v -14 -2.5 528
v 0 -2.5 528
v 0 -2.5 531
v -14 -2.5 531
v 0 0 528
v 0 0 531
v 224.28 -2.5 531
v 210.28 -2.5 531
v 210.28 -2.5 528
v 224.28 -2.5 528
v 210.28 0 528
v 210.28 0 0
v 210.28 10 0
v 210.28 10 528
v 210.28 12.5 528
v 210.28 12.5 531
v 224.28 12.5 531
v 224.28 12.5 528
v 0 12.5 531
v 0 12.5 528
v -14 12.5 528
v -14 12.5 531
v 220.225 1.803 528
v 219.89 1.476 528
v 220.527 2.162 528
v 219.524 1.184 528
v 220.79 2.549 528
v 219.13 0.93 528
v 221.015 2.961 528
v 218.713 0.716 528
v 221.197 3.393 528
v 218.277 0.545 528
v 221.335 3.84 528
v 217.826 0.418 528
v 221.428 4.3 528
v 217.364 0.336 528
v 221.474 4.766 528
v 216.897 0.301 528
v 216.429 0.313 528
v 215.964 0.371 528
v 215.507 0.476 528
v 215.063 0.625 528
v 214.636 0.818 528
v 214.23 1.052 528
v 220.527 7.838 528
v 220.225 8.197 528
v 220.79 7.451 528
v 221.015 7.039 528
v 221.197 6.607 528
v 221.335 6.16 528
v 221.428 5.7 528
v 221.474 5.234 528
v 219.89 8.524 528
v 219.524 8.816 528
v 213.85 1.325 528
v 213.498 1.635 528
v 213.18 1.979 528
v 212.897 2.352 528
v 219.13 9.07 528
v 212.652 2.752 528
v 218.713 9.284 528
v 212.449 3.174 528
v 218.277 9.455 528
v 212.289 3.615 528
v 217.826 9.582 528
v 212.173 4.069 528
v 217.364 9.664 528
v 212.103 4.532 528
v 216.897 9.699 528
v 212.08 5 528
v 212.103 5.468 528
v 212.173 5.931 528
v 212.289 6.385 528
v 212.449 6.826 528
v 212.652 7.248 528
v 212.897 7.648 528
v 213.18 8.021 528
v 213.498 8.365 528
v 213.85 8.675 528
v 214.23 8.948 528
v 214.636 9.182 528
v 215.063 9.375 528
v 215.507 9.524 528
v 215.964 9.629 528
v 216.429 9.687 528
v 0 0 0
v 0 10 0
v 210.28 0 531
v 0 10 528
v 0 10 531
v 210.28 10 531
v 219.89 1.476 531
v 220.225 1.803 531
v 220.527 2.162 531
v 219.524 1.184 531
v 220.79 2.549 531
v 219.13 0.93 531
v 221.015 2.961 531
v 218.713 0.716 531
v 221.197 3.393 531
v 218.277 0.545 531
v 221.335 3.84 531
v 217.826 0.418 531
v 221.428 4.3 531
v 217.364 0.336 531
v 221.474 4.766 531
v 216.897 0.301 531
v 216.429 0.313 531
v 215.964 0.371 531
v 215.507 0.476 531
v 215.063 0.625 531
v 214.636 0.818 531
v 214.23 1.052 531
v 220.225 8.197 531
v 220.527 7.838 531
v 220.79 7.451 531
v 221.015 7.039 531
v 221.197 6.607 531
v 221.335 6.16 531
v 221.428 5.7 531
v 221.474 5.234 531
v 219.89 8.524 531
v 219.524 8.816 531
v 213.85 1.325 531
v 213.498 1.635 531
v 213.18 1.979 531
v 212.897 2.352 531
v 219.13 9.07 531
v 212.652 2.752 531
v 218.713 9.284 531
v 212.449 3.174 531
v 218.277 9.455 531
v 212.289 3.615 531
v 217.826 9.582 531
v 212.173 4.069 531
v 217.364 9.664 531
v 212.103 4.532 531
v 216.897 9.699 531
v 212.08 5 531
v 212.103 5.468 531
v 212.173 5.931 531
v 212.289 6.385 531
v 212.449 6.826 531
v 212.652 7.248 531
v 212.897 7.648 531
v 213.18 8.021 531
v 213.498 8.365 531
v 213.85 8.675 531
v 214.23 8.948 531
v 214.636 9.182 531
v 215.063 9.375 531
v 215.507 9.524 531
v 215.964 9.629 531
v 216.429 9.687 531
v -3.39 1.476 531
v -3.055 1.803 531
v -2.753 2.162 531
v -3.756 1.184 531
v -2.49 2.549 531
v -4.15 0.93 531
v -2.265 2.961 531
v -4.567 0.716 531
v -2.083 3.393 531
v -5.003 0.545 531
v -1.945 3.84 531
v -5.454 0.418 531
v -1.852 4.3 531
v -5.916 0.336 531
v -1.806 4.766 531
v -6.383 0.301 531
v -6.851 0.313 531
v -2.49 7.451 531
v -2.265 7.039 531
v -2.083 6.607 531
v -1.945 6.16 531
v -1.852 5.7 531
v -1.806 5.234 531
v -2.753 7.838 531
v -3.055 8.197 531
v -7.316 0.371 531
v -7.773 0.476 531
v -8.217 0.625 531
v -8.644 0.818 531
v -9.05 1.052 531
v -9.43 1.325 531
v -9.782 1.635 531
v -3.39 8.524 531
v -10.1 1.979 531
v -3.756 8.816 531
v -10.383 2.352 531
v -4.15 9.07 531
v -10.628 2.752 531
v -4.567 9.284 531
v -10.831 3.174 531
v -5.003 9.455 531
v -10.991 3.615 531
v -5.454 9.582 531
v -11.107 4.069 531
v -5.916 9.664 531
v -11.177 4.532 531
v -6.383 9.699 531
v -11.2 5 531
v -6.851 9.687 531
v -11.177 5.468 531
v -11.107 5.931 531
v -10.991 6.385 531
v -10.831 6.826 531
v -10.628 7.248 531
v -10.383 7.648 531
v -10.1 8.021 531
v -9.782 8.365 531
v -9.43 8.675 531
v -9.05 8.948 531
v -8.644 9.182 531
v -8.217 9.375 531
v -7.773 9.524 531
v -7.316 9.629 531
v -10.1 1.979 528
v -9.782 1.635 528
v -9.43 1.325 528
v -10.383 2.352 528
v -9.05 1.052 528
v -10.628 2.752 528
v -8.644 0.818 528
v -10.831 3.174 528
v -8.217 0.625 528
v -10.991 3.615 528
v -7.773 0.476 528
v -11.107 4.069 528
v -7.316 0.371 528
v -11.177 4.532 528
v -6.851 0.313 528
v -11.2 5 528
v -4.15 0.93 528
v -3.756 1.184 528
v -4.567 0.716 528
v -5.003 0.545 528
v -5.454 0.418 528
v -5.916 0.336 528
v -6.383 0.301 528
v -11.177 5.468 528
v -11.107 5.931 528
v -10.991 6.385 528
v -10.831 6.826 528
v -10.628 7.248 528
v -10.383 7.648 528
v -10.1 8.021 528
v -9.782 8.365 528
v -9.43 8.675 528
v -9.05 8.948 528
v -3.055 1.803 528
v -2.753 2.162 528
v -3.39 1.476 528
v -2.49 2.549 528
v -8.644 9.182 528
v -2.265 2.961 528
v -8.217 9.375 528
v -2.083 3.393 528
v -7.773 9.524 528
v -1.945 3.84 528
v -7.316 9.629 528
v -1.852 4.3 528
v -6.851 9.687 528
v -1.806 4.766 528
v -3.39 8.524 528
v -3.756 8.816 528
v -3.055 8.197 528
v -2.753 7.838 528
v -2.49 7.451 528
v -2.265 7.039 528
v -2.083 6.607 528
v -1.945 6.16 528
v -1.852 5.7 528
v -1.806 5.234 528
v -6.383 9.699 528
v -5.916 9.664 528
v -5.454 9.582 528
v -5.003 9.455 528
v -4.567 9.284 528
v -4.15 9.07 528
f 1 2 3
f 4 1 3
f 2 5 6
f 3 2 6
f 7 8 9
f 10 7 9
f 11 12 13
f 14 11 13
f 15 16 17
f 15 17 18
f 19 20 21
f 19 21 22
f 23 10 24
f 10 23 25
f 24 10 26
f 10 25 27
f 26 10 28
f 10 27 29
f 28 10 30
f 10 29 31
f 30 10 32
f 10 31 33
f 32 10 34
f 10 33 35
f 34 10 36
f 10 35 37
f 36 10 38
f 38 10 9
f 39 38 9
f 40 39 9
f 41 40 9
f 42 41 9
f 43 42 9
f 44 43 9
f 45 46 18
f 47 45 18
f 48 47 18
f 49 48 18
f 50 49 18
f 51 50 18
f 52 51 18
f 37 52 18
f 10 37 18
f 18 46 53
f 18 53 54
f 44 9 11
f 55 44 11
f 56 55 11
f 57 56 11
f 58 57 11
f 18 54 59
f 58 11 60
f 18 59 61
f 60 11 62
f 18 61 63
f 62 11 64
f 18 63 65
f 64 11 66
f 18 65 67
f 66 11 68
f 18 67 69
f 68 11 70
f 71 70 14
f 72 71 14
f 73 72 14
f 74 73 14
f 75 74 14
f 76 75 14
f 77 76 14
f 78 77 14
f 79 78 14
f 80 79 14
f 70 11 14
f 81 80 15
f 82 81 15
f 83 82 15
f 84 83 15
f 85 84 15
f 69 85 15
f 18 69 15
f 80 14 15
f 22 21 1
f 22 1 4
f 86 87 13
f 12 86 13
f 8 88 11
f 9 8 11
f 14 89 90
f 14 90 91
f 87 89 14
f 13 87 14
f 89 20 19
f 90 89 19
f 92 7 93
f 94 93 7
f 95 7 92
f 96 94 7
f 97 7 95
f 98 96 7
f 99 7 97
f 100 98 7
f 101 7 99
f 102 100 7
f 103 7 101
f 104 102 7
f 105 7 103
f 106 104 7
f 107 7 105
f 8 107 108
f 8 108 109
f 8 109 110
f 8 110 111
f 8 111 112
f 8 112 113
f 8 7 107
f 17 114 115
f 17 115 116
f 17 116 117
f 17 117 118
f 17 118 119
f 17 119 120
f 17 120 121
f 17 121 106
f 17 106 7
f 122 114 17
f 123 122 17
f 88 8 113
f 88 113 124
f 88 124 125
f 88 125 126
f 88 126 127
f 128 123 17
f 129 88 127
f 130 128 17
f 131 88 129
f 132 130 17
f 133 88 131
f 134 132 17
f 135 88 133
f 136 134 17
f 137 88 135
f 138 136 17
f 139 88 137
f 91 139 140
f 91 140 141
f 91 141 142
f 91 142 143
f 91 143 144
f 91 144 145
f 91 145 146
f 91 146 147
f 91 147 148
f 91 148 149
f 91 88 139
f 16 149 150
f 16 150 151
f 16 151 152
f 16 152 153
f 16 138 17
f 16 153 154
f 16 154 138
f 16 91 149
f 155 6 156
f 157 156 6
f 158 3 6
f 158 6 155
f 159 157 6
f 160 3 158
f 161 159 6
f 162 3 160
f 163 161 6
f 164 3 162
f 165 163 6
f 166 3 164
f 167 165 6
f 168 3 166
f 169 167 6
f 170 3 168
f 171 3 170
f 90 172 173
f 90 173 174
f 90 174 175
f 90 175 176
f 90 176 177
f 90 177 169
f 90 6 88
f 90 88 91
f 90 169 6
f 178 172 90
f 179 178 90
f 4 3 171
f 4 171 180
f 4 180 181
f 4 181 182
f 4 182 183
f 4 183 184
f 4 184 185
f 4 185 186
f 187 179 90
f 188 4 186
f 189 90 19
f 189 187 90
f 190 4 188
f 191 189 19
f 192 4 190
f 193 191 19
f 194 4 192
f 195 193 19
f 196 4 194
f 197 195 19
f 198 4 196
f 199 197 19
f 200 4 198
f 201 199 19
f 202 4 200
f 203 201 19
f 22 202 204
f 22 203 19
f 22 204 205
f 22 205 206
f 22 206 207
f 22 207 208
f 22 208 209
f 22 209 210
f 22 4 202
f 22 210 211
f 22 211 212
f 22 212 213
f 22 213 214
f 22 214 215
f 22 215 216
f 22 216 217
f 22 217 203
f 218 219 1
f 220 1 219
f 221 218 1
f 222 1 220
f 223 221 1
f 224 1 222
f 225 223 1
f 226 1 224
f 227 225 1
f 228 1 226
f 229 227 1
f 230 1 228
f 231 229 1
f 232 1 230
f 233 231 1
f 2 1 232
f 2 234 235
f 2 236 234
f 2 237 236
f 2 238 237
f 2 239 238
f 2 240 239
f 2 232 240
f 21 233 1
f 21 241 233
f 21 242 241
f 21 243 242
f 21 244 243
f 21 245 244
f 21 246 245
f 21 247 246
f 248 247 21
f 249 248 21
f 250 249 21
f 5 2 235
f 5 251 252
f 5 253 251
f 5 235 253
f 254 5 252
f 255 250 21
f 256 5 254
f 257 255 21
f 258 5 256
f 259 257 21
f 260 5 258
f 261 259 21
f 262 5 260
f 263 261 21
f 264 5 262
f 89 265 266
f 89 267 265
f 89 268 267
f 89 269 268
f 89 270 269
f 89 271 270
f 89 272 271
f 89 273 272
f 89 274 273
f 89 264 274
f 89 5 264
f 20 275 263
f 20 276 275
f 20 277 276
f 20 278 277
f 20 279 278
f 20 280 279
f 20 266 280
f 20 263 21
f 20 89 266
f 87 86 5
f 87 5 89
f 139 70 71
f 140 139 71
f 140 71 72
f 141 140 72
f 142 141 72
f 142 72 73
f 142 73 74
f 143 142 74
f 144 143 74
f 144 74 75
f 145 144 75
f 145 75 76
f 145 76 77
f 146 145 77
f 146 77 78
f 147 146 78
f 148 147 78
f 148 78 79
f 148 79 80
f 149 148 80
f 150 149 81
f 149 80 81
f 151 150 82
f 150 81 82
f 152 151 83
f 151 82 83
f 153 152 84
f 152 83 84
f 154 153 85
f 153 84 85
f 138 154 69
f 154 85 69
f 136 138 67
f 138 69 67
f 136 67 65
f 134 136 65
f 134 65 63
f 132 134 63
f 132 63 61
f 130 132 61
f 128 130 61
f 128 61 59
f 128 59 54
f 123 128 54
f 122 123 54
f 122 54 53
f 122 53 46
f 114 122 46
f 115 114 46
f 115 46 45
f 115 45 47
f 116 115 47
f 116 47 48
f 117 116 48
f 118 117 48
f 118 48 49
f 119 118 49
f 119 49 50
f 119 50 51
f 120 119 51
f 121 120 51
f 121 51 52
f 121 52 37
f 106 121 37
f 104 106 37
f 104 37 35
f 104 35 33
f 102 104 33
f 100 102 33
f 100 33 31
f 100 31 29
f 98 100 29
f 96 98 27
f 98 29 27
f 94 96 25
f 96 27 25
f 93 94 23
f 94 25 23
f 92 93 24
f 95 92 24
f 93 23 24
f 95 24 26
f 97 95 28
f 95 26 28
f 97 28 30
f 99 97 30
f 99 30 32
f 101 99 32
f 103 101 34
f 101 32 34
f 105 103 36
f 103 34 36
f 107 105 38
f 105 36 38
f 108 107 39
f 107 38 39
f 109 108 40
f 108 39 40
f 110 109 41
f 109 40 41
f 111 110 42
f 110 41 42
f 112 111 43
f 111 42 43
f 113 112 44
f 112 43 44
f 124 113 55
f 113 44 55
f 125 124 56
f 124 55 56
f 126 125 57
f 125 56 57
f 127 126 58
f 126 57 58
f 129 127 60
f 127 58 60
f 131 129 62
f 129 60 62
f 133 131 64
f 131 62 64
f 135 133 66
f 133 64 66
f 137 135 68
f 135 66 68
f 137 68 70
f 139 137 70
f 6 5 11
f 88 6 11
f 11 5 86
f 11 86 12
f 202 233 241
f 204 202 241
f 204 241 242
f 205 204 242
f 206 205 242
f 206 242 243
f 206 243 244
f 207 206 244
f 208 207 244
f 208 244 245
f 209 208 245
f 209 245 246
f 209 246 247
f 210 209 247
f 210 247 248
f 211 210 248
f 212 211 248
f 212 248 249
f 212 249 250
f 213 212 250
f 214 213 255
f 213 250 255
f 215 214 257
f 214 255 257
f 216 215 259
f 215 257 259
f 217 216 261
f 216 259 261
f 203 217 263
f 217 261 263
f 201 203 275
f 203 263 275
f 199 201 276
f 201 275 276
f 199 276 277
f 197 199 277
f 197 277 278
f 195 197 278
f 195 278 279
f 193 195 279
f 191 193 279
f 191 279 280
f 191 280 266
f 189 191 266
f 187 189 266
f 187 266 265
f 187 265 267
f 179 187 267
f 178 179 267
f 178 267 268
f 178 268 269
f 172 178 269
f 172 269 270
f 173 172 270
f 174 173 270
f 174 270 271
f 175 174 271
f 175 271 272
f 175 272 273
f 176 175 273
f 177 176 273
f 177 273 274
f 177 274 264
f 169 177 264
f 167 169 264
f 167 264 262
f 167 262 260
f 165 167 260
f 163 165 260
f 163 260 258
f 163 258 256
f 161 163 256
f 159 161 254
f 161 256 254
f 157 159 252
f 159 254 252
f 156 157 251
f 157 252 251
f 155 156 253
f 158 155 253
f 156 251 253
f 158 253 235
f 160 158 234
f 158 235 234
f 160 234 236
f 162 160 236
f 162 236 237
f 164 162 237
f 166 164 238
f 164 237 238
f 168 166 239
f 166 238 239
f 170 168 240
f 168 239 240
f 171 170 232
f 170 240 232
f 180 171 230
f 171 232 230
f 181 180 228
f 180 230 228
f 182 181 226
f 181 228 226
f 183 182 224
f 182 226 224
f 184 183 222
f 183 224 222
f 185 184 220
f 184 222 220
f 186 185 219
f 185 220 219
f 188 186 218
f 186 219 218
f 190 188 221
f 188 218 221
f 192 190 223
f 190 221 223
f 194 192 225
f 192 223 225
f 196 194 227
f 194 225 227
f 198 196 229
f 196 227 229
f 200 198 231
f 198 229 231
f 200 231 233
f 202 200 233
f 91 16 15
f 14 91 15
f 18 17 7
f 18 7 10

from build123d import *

# Parameters (mm, degrees)
SKETCH1_W           = 210.28
SKETCH1_H           = 10
BOSS_EXTRUDE1_DEPTH = 531
SKETCH2_W           = 3
SKETCH2_H           = 15
BOSS_EXTRUDE2_DEPTH = 14
SKETCH4_W           = 3
SKETCH4_H           = 15
BOSS_EXTRUDE3_DEPTH = 14
SKETCH3_R           = 4.7
CUT_EXTRUDE1_DEPTH  = 13


with BuildPart() as part:
    # Sketch1 → Boss-Extrude1 (new body)
    with BuildSketch(Plane.XY):
        with Locations((105.14, 5)):
            Rectangle(SKETCH1_W, SKETCH1_H)
    extrude(amount=BOSS_EXTRUDE1_DEPTH)

    # Sketch2 → Boss-Extrude2 (add)
    with BuildSketch(Plane.ZY):
        with Locations((529.5, 5)):
            Rectangle(SKETCH2_W, SKETCH2_H)
    extrude(amount=BOSS_EXTRUDE2_DEPTH)

    # Sketch4 → Boss-Extrude3 (add)
    with BuildSketch(Plane(origin=(210.28, 0, 0), x_dir=(0, 0, -1), z_dir=(1, 0, 0))):
        with Locations((-529.5, 5)):
            Rectangle(SKETCH4_W, SKETCH4_H)
    extrude(amount=BOSS_EXTRUDE3_DEPTH)

    # Sketch3 → Cut-Extrude1 (cut)
    with BuildSketch(Plane(origin=(0, 0, 528), x_dir=(-1, 0, 0), z_dir=(0, 0, -1))):
        with Locations((6.5, 5)):
            Circle(SKETCH3_R)
        with Locations((-216.78, 5)):
            Circle(SKETCH3_R)
    extrude(amount=-CUT_EXTRUDE1_DEPTH, mode=Mode.SUBTRACT)


solid = part.part
